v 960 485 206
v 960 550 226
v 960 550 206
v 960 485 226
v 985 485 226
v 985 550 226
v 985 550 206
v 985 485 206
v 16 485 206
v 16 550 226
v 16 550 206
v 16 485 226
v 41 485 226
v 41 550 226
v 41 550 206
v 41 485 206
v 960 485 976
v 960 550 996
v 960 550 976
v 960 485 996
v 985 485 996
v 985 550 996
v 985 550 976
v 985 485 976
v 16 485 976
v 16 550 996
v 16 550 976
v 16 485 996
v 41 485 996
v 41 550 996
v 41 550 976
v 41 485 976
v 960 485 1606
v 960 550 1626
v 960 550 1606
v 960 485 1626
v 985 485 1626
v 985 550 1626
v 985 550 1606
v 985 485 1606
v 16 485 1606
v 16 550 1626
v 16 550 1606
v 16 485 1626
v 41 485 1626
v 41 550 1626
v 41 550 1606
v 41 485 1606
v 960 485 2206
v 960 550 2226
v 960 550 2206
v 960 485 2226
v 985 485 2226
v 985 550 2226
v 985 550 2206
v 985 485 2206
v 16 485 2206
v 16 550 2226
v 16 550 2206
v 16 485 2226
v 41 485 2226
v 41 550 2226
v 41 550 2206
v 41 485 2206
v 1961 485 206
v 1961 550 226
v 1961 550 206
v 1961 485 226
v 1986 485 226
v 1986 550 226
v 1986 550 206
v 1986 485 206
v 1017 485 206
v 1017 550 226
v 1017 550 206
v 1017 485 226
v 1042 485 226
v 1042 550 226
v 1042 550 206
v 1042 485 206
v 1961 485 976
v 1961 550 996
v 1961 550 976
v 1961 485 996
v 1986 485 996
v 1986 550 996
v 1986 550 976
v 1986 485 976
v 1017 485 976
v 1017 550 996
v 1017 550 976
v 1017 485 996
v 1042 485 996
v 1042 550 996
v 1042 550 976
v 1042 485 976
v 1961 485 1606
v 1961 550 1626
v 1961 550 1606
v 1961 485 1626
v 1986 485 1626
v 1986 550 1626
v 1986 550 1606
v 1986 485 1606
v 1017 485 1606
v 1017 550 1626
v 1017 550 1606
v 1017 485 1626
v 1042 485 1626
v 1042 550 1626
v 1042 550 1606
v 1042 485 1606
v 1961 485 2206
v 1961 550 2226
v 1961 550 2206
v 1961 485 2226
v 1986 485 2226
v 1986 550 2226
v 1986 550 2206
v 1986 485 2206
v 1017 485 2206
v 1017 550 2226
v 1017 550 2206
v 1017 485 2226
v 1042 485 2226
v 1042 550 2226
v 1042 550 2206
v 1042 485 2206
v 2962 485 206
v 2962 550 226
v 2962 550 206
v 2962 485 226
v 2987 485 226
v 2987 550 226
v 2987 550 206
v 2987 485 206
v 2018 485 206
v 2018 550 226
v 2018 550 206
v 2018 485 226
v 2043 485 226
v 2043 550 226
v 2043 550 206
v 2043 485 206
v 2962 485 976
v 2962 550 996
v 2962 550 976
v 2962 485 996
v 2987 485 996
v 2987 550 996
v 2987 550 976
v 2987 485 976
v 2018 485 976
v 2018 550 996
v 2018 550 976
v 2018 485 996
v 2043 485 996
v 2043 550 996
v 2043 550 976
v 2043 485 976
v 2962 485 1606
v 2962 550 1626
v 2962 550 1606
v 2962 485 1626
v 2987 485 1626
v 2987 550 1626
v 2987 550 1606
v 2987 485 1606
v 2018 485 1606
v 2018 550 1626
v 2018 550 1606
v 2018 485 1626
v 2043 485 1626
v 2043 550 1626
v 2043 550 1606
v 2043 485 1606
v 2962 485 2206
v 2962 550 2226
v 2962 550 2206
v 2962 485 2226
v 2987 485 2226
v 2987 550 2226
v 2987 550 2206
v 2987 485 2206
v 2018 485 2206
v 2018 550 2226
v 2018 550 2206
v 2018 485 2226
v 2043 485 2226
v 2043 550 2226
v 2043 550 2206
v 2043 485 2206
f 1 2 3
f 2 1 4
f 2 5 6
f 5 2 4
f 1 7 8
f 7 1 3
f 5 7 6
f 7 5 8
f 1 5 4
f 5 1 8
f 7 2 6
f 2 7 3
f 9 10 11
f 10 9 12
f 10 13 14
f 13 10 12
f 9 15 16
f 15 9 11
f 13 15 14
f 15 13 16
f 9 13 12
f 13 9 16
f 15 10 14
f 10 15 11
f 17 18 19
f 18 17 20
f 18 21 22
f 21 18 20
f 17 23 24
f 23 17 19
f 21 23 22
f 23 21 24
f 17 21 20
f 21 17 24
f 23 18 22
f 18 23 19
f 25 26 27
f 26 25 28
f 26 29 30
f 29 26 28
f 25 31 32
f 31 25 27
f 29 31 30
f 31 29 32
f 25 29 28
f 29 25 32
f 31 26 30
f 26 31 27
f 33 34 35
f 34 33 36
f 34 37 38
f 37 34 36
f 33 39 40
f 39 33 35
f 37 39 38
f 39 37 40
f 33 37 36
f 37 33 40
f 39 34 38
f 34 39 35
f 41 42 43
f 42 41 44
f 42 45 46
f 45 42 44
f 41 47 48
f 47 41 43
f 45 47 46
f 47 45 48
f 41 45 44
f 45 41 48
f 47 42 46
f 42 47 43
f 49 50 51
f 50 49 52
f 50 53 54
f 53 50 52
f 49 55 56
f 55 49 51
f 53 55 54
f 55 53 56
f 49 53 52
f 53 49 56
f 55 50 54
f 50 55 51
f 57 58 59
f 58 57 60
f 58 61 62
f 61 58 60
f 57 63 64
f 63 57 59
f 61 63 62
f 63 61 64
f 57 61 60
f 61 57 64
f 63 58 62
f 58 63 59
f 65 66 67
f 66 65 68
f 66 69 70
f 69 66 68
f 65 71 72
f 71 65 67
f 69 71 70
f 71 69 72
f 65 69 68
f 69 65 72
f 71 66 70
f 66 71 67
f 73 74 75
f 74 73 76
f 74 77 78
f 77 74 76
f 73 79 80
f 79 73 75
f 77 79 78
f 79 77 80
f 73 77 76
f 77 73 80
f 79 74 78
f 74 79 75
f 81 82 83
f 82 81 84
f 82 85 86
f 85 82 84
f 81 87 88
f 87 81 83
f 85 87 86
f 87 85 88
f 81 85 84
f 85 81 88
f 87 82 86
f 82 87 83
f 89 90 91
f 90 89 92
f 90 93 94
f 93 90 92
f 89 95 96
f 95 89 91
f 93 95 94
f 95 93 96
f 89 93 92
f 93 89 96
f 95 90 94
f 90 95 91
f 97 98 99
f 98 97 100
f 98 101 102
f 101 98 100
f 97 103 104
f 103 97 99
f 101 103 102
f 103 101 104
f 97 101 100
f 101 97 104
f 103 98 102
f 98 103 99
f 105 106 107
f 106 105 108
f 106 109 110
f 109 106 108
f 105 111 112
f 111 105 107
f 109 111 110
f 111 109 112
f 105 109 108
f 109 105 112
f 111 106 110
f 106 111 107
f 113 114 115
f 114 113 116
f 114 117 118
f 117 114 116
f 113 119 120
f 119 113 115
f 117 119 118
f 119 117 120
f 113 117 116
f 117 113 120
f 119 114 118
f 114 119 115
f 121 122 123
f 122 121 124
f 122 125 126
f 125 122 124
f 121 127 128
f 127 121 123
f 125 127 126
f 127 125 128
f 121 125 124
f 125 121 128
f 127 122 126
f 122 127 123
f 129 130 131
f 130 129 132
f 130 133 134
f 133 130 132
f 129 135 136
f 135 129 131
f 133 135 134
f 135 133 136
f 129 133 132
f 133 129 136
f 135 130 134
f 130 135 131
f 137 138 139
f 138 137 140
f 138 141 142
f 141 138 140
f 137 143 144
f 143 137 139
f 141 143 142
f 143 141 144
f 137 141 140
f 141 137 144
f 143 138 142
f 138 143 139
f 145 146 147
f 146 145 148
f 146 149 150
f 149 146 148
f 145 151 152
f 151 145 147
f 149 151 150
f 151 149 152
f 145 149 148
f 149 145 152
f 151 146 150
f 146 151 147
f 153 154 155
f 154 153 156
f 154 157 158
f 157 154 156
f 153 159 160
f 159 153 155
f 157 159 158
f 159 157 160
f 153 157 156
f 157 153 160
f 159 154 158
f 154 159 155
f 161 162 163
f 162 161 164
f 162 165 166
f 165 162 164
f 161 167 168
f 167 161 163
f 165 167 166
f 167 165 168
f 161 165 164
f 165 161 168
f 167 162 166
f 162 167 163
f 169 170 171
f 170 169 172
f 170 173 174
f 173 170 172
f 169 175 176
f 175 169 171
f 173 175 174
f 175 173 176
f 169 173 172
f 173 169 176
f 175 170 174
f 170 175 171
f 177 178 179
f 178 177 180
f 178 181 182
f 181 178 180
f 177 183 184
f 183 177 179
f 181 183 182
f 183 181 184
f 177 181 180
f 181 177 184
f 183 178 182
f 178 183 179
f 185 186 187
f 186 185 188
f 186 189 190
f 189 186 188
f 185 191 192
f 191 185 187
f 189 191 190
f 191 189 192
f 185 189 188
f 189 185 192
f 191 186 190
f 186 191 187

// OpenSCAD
ROOM_WITH = 3003;
ROOM_HEIGTH = 2325;
BACK_OFFSET = 100;
Z_OFFSET=100 + 16;
COUPE_DEPTH = 550;

asmpad = 0;
dpad = 0;
dangle = 0;


//translate([1500,1500,0]) toolbox();
//translate([1500,2500,0]) toolbox2();


difference() {
    all();
    //translate([-200,-4000-80,-200]) rotate([-0.5,0,0.8])  cube([3400,4000,4000]);
}

/*
color("Red") scale([1,-1,1]) {
    translate([-1,0,0]) cube([20,80,20]);
    translate([-1,0,2086-20]) cube([20,60,20]);
    translate([ROOM_WITH-1,0,0]) cube([20,35,20]);
    translate([ROOM_WITH-1,0,2086-20]) cube([20,20,20]);
}
*/

module all() {
    //room();

    //racks();
    //doors();
    pedestal();

    container_1();
    container_2();
    container_3();

}

module pedestal() {
    //translate([1,-BACK_OFFSET,100]) rotate([0,0,0]) sheet(1000, COUPE_DEPTH+BACK_OFFSET, 16, [true, true, 0, true]);
    //translate([1001,-BACK_OFFSET,100]) rotate([0,0,0]) sheet(1001, COUPE_DEPTH+BACK_OFFSET, 16, [true, true, 0, true]);
    //translate([2002,-BACK_OFFSET,100]) rotate([0,0,0]) sheet(1000, COUPE_DEPTH+BACK_OFFSET, 16, [true, true, 0, true]);
    //translate([1,COUPE_DEPTH-40,0]) rotate([90,0,0]) sheet(1500, 98, 16, [true, true, true, true]);
    //translate([1502,COUPE_DEPTH-40,0]) rotate([90,0,0]) sheet(1500, 98, 16, [true, true, true, true]);
    //translate([1,-15,0]) pedestal_box();
    //translate([1000,-15,0]) pedestal_box();
    //translate([2000,-15,0]) pedestal_box();
}

module container_1() {
    translate([969+16,COUPE_DEPTH,0]) rotate([0,0,180]) {
        //#cube([969, COUPE_DEPTH, ROOM_HEIGTH]);
        hinges();
        //translate([0,0,ROOM_HEIGTH-25]) sheet(969, 60, 25, [true, true, true, true]);
        //translate([0,10,2050]) sheet(969, COUPE_DEPTH+BACK_OFFSET, 25, [true, true, true, 0]);
        //translate([0,10,Z_OFFSET+350]) sheet(969, COUPE_DEPTH+BACK_OFFSET, 25, [true, true, true, 0]);
        commode1();
    }
}

module commode1() {

    // Верхушка
    //translate([0,10,Z_OFFSET+801]) sheet(493, COUPE_DEPTH+BACK_OFFSET-10, 16, [true, true, true, 0]);

    //Боковина
    //translate([16,10,Z_OFFSET+350+25]) rotate([0,-90,0]) sheet(801-350-25, COUPE_DEPTH-10, 16, [1, 1, 1, 1]);

    //Центральная стойка
    //translate([(970+16)/2,10,Z_OFFSET+350+25]) rotate([0,-90,0]) sheet(801-350-25, COUPE_DEPTH+BACK_OFFSET-10, 16, [1, 1, 1, 0]);

    // Фасады
    face_width = 493-16-16-2-2;
    comode_z_base = Z_OFFSET + 350 + 25;
    /*
    translate([16+2,10+16-dpad*30, comode_z_base+2]) rotate([90,0,0]) sheet(face_width, 180, 16, [true, true, true, true], "V");
    translate([16+2,10+16-dpad*20, comode_z_base+2+180+32]) rotate([90,0,0]) sheet(face_width, 180, 16, [true, true, true, true], "V");
    */

    //Ящики
    box_width = (970 - 16*2 - 4*4 - 16)/2;
    /*
    translate([16+4,16+10-dpad*30, comode_z_base+20]) box(180-20-30, 550, box_width, asmpad);
    translate([16+4,16+10-dpad*20, comode_z_base+20+180+32]) box(180-20-30, 550, box_width, asmpad);
    */

}

module container_2() {
    translate([969+16+32+969,COUPE_DEPTH,0]) rotate([0,0,180]) {
        //#cube([969, COUPE_DEPTH, ROOM_HEIGTH]);
        hinges();
        //translate([0,0,ROOM_HEIGTH-25]) sheet(969, 60, 25, [true, true, true, true]);
        //translate([0,10,2050]) sheet(969, COUPE_DEPTH+BACK_OFFSET, 25, [true, true, true, 0]);
        commode2();
    }
}

module commode2() {

    //translate([0,10,Z_OFFSET+200]) sheet(969, COUPE_DEPTH-10, 16, [1, 1, 1, 1]);
    //translate([(969+25)/2,10,Z_OFFSET]) rotate([0,-90,0]) sheet(200, COUPE_DEPTH-10, 25, [1, 1, 1, 1]);

    // Верхушка
    //translate([0,10,Z_OFFSET+800]) sheet(969, COUPE_DEPTH+BACK_OFFSET, 16, [true, true, true, 0]);
    //translate([0,65-16+25,Z_OFFSET+800+25]) rotate([90,0,0]) sheet(969, 80, 25, [true, true, true, true]);

    //Боковина
    //translate([16,10,Z_OFFSET+200+16]) rotate([0,-90,0]) sheet(800-200-16, COUPE_DEPTH-10, 16, [1, 1, 1, 1]);
    //translate([969,10,Z_OFFSET+200+16]) rotate([0,-90,0]) sheet(800-200-16, COUPE_DEPTH-10, 16, [1, 1, 1, 1]);

    //Центральная стойка
    //translate([(969+25)/2,10,Z_OFFSET+200+16]) rotate([0,-90,0]) sheet(800-200-16, COUPE_DEPTH-10, 25, [1, 1, 1, 1]);


    // Фасады
    face_width = (969 - 16*2 - 2*4 - 25)/2;
    comode_z_base = Z_OFFSET + 200 + 16;
    /*
    translate([16+2,10+16-dpad*30, comode_z_base+2]) rotate([90,0,0]) sheet(face_width, 300, 16, [true, true, true, true], "V");
    translate([16+2,10+16-dpad*20, comode_z_base+2+300+32]) rotate([90,0,0]) sheet(face_width, 218, 16, [true, true, true, true], "V");
    translate([16+2+face_width+2+25+2,10+16-dpad*30, comode_z_base+2]) rotate([90,0,0]) sheet(face_width, 300, 16, [true, true, true, true], "V");
    translate([16+2+face_width+2+25+2,10+16-dpad*20, comode_z_base+2+300+32]) rotate([90,0,0]) sheet(face_width, 218, 16, [true, true, true, true], "V");
    */

    //Ящики
    box_width = (969 - 16*2 - 4*4 - 25)/2;
    /*
    translate([16+4,16+10-dpad*30, comode_z_base+20]) box(300-20-30, 550, box_width, asmpad);
    translate([16+4,16+10-dpad*20, comode_z_base+20+300+32]) box(218-20-30, 550, box_width, asmpad);
    translate([16+4+box_width+4+25+4,16+10-dpad*30, comode_z_base+20]) box(300-20-30, 550, box_width, asmpad);
    translate([16+4+box_width+4+25+4,16+10-dpad*20, comode_z_base+20+300+32]) box(218-20-30, 550, box_width, asmpad);
    */

}

module container_3() {
    translate([969+16+32+969+32+969,COUPE_DEPTH,0]) rotate([0,0,180]) {
        //#cube([969, COUPE_DEPTH, ROOM_HEIGTH]);
        hinges();
        //translate([0,0,ROOM_HEIGTH-25]) sheet(969, 60, 25, [true, true, true, true]);
        //translate([0,10,2050]) sheet(969, COUPE_DEPTH+BACK_OFFSET, 25, [true, true, true, 0]);
        //translate([0,10,2050-330]) sheet(969, COUPE_DEPTH+BACK_OFFSET, 16, [true, true, true, 0]);

        //#translate([0, 0, Z_OFFSET]) cube([265,260,1300]);
        //#translate([265+16, 0, Z_OFFSET]) cube([105,500,1600]);

        //translate([16+264,10,Z_OFFSET]) rotate([0,-90,0]) sheet(2050-330-Z_OFFSET, COUPE_DEPTH+BACK_OFFSET-10, 16, [true, true, true, 0]);
        //translate([16+264+105+16,10,Z_OFFSET]) rotate([0,-90,0]) sheet(2050-330-Z_OFFSET, COUPE_DEPTH+BACK_OFFSET-10, 16, [true, true, true, 0]);

        //translate([265+16+105,400,Z_OFFSET]) rotate([90,-90,0]) sheet(400, 105, 16, [true, true, true, true]);

        //translate([0,10+260,400 + 350*0]) sheet(263, 306, 16, [true, true, true, true]);
        //translate([0,10+260,400 + 350*1]) sheet(263, 306, 16, [true, true, true, true]);
        //translate([0,10+260,400 + 350*2]) sheet(263, 303, 16, [true, true, true, true]);
        //translate([0,10+260,400 + 350*3]) sheet(263, 301, 16, [true, true, true, true]);
        //translate([0,10+260+16,1116]) rotate([90,0,0]) sheet(263, 200, 16, [true, true, true, true]);

        // Полки правые
        /*
        translate([16+264+105+16,10,Z_OFFSET + 180 + 20]) sheet(568, COUPE_DEPTH+BACK_OFFSET-10, 16, [true, true, true, 0]);
        translate([16+264+105+16,10,Z_OFFSET + 180*2 + 20*2 +16]) sheet(568, COUPE_DEPTH+BACK_OFFSET-10, 16, [true, true, true, 0]);
        translate([16+264+105+16,10,Z_OFFSET + 180*2 + 20*2 +16*2+300]) sheet(568, COUPE_DEPTH+BACK_OFFSET-10, 16, [true, true, true, 0]);
        translate([16+264+105+16,10,Z_OFFSET + 180*2 + 20*2 +16*3+300*2]) sheet(568, COUPE_DEPTH+BACK_OFFSET-10, 16, [true, true, true, 0]);
        translate([16+264+105+16,10,Z_OFFSET + 180*2 + 20*2 +16*4+300*2+262]) sheet(568, COUPE_DEPTH+BACK_OFFSET-10, 16, [true, true, true, 0]);
        */
        //translate([16+264+105+16+270,10,Z_OFFSET + 180*2 + 20*2 +16*4+300*2]) rotate([0,-90,0]) sheet(262, COUPE_DEPTH+BACK_OFFSET-10, 16, [true, true, true, 0]);
        //translate([16+264+105+16+270,10,Z_OFFSET + 180*2 + 20*2 +16*4+300*2+16+262]) rotate([0,-90,0]) sheet(262, COUPE_DEPTH+BACK_OFFSET-10, 16, [true, true, true, 0]);

    }
}

module hinges() {
    translate([0,0,Z_OFFSET+100]) {
        hinge();
        translate([969-25,0,0]) hinge();
    }
    translate([0,0,Z_OFFSET+870]) {
        hinge();
        translate([969-25,0,0]) hinge();
    }
    translate([0,0,Z_OFFSET+1500]) {
        hinge();
        translate([969-25,0,0]) hinge();
    }
    translate([0,0,Z_OFFSET+2100]) {
        hinge();
        translate([969-25,0,0]) hinge();
    }
}

module hinge() {
    color("Grey") translate([0,0,-10]) cube([25,65,20]);
}

module racks() {
    translate([16,-BACK_OFFSET,Z_OFFSET]) rotate([0,-90,0]) sheet(ROOM_HEIGTH-Z_OFFSET, COUPE_DEPTH+BACK_OFFSET, 16, [true, true, 0, true]);
    translate([ROOM_WITH,-BACK_OFFSET,Z_OFFSET]) rotate([0,-90,0]) sheet(ROOM_HEIGTH-Z_OFFSET, COUPE_DEPTH+BACK_OFFSET, 16, [true, true, 0, true]);
    translate([ROOM_WITH-16-969,-BACK_OFFSET,Z_OFFSET]) rotate([0,-90,0]) sheet(ROOM_HEIGTH-Z_OFFSET, COUPE_DEPTH+BACK_OFFSET, 16, [true, true, 0, true]);
    translate([ROOM_WITH-16-16-969,-BACK_OFFSET,Z_OFFSET]) rotate([0,-90,0]) sheet(ROOM_HEIGTH-Z_OFFSET, COUPE_DEPTH+BACK_OFFSET, 16, [true, true, 0, true]);
    translate([16+16+969,-BACK_OFFSET,Z_OFFSET]) rotate([0,-90,0]) sheet(ROOM_HEIGTH-Z_OFFSET, COUPE_DEPTH+BACK_OFFSET, 16, [true, true, 0, true]);
    translate([16+32+969,-BACK_OFFSET,Z_OFFSET]) rotate([0,-90,0]) sheet(ROOM_HEIGTH-Z_OFFSET, COUPE_DEPTH+BACK_OFFSET, 16, [true, true, 0, true]);
}

module doors() {
    for (i =[0:5]) translate([5 + 500*i,COUPE_DEPTH*2+20,ROOM_HEIGTH]) rotate([180,0,0]) door(2215, i%2);
}

module door(h=2294, even) {
    echo("Door", h, 496);
    if(even) {
        translate([496,COUPE_DEPTH+3,10]) scale([1,-1,1]) rotate([180,-90,-90-dangle]) {
            door_sheet(h);
        }
    } else {
        translate([0,COUPE_DEPTH+3,10]) rotate([0,-90,-90-dangle]) {
            door_sheet(h);
        }
    }
}

module door_sheet(h=2294) {
    difference() {
        sheet(h, 496, 19, [true, true, true, true]);
        translate([h-10-16-100,10,0]) #cube(20); 
        translate([h-10-16-870,10,0]) #cube(20); 
        translate([h-10-16-1500,10,0]) #cube(20);
        translate([h-10-16-2100,10,0]) #cube(20); 
        color("WhiteSmoke") {
            translate([80,80,-15]) cube([h/2-160, 496-160, 19]);
            translate([h/2 + 80,80,-15]) cube([h/2-160, 496-160, 19]);
        }
    }
}

module room() {
    //translate([ROOM_WITH,-BACK_OFFSET,0]) color("WhiteSmoke") cube([10,2000,ROOM_HEIGTH]);
    //translate([0,-50,ROOM_HEIGTH]) color("White") cube([ROOM_WITH,2000,10]);
    translate([0,-BACK_OFFSET,-10]) color("Gray") cube([ROOM_WITH,2000,10]);
    translate([-20,440-475,2085]) color("Red") cube([ROOM_WITH+50,110,240]);
    translate([-10,-BACK_OFFSET,0]) color("Teal") cube([10,2000,ROOM_HEIGTH]);
}

module boxes() {

    color("Pink") {

        translate([40 + 240*0, 150,2080]) cube([220, 340, 160]);

        translate([2030, 0,Z_OFFSET]) stuk_1();
        translate([2030, 0,Z_OFFSET+180+20+16]) stuk_1();
        translate([2030+200+10, 0,Z_OFFSET+180+20+16+180+20+16]) stuk_2();
        translate([2030, 0,Z_OFFSET+180+20+16+180+20+16]) stuk_3();
        translate([2030+200+10, 0,Z_OFFSET+180+20+16+180+20+16+16+300]) stuk_2();
        translate([2030, 0,Z_OFFSET+180+20+16+180+20+16+16+300]) stuk_3();

        translate([1045, -20,Z_OFFSET]) skub_2();
        translate([1520, -20,Z_OFFSET]) skub_2();

        translate([30, -20,Z_OFFSET]) skub_3();
        translate([345, -20,Z_OFFSET]) skub_3();
        translate([660, -20,Z_OFFSET]) skub_3();

    }

}

module stuk_1() {
    // id 103.642.74
    cube([550,510,180]);
}

module stuk_2() {
    // id 903.644.87
    cube([340,510,180]);
}

module stuk_3() {
    // id 203.642.35
    cube([200,510,180]);
}

module skub_1() {
    // id 603.751.14
    cube([930,550,190]);
}

module skub_2() {
    // id 403.750.92
    cube([440,550,190]);
}


module skub_3() {
    // id 603.751.09
    cube([310,550,330]);
}

module sheet(length, width, thickness, edging, edging_letter="L") {
    
    translate([0.5,0.5,0]) {
        color("White") cube([length-1, width-1, 0.1]);
        translate([0,0,0.1]) color("Green") cube([length-1, width-1, thickness-0.2]);
        translate([0,0,thickness]) color("White") cube([length-1, width-1, 0.1]);
    }
    if (edging[0]) color("White") cube([0.5, width, thickness]);
    if (edging[1]) translate([length-0.5,0,0]) color("White") cube([0.5, width, thickness]);
    if (edging[2]) color("White") cube([length, 0.5, thickness]);
    if (edging[3]) translate([0,width-0.5,0]) color("White") cube([length, 0.5, thickness]);
    translate([10,10,thickness]) rotate([0,0,0]) #text(str(length, " x ", width, " x ", thickness), size=30);


    saw_pad_width = (edging_letter == "L") ? ((!edging[2] && !edging[3]) ? 0 : 1) : 4;
    saw_pad_length = (edging_letter == "L") ? ((!edging[0] && !edging[1]) ? 0 : 1) : 4;

    saw_width = width-saw_pad_width;
    saw_length = length-saw_pad_length;

    edging_string_width = str(
        edging[0] ? edging_letter : "",
        edging[1] ? edging_letter : ""
    );

    edging_string_length = str(
        edging[2] ? edging_letter : "",
        edging[3] ? edging_letter : ""
    );

    //echo(str(saw_length, "_", saw_width, "_", thickness, "_", edging_string_length, "_", edging_string_width));
    
}


module box(h, w, t, asmpad) {
    // Дно
    translate([16,16,12]) sheet(t-32,w-32,16);
    // Боковины
    translate([0-asmpad,0,0]) rotate([90,0,90]) sheet(w,h,16,[1,1,1,1]);
    translate([t-32+16+asmpad,0,0]) rotate([90,0,90]) sheet(w,h,16,[1,1,1,1]);
    // Лбы
    translate([16,16-asmpad,12]) rotate([90,0,0]) sheet(t-32,h-12,16,[0,0,1,1]);
    translate([16,w+asmpad,12]) rotate([90,0,0]) sheet(t-32,h-12,16,[0,0,1,1]);
}

module pedestal_box(h=98, w=508, t=999, asmpad=0) {
    // Боковины
    translate([0-asmpad,0,0]) rotate([90,0,90]) sheet(w,h,16,[1,1,1,1]);
    translate([t-32+16+asmpad,0,0]) rotate([90,0,90]) sheet(w,h,16,[1,1,1,1]);
    // Лбы
    translate([16,16-asmpad,0]) rotate([90,0,0]) sheet(t-32,h,16,[1,1,1,1]);
    translate([16,w+asmpad,0]) rotate([90,0,0]) sheet(t-32,h,16,[1,1,1,1]); 
}

module toolbox(h=216, w=350, t=316+32, asmpad=10) {
    // Дно
    translate([16,16,0]) sheet(t-32,w-32,16);
    // Боковины
    translate([0-asmpad,0,0]) rotate([90,0,90]) sheet(w,h,16,[1,1,1,1]);
    translate([t-32+16+asmpad,0,0]) rotate([90,0,90]) sheet(w,h,16,[1,1,1,1]);
    // Лбы
    translate([16,16-asmpad,0]) rotate([90,0,0]) sheet(t-32,h,16,[0,0,1,1]);
    translate([16,w+asmpad,0]) rotate([90,0,0]) sheet(t-32,h,16,[0,0,1,1]);
}

module toolbox2() {
    translate([16,16,0]) sheet(300,300,16,[1,1,1,1]);
    translate([0,0,0]) rotate([90,0,90]) sheet(250,100,16,[1,1,1,1]);
    translate([16,0,0]) rotate([90,0,0]) sheet(250,100,16,[1,1,1,1]);
}
